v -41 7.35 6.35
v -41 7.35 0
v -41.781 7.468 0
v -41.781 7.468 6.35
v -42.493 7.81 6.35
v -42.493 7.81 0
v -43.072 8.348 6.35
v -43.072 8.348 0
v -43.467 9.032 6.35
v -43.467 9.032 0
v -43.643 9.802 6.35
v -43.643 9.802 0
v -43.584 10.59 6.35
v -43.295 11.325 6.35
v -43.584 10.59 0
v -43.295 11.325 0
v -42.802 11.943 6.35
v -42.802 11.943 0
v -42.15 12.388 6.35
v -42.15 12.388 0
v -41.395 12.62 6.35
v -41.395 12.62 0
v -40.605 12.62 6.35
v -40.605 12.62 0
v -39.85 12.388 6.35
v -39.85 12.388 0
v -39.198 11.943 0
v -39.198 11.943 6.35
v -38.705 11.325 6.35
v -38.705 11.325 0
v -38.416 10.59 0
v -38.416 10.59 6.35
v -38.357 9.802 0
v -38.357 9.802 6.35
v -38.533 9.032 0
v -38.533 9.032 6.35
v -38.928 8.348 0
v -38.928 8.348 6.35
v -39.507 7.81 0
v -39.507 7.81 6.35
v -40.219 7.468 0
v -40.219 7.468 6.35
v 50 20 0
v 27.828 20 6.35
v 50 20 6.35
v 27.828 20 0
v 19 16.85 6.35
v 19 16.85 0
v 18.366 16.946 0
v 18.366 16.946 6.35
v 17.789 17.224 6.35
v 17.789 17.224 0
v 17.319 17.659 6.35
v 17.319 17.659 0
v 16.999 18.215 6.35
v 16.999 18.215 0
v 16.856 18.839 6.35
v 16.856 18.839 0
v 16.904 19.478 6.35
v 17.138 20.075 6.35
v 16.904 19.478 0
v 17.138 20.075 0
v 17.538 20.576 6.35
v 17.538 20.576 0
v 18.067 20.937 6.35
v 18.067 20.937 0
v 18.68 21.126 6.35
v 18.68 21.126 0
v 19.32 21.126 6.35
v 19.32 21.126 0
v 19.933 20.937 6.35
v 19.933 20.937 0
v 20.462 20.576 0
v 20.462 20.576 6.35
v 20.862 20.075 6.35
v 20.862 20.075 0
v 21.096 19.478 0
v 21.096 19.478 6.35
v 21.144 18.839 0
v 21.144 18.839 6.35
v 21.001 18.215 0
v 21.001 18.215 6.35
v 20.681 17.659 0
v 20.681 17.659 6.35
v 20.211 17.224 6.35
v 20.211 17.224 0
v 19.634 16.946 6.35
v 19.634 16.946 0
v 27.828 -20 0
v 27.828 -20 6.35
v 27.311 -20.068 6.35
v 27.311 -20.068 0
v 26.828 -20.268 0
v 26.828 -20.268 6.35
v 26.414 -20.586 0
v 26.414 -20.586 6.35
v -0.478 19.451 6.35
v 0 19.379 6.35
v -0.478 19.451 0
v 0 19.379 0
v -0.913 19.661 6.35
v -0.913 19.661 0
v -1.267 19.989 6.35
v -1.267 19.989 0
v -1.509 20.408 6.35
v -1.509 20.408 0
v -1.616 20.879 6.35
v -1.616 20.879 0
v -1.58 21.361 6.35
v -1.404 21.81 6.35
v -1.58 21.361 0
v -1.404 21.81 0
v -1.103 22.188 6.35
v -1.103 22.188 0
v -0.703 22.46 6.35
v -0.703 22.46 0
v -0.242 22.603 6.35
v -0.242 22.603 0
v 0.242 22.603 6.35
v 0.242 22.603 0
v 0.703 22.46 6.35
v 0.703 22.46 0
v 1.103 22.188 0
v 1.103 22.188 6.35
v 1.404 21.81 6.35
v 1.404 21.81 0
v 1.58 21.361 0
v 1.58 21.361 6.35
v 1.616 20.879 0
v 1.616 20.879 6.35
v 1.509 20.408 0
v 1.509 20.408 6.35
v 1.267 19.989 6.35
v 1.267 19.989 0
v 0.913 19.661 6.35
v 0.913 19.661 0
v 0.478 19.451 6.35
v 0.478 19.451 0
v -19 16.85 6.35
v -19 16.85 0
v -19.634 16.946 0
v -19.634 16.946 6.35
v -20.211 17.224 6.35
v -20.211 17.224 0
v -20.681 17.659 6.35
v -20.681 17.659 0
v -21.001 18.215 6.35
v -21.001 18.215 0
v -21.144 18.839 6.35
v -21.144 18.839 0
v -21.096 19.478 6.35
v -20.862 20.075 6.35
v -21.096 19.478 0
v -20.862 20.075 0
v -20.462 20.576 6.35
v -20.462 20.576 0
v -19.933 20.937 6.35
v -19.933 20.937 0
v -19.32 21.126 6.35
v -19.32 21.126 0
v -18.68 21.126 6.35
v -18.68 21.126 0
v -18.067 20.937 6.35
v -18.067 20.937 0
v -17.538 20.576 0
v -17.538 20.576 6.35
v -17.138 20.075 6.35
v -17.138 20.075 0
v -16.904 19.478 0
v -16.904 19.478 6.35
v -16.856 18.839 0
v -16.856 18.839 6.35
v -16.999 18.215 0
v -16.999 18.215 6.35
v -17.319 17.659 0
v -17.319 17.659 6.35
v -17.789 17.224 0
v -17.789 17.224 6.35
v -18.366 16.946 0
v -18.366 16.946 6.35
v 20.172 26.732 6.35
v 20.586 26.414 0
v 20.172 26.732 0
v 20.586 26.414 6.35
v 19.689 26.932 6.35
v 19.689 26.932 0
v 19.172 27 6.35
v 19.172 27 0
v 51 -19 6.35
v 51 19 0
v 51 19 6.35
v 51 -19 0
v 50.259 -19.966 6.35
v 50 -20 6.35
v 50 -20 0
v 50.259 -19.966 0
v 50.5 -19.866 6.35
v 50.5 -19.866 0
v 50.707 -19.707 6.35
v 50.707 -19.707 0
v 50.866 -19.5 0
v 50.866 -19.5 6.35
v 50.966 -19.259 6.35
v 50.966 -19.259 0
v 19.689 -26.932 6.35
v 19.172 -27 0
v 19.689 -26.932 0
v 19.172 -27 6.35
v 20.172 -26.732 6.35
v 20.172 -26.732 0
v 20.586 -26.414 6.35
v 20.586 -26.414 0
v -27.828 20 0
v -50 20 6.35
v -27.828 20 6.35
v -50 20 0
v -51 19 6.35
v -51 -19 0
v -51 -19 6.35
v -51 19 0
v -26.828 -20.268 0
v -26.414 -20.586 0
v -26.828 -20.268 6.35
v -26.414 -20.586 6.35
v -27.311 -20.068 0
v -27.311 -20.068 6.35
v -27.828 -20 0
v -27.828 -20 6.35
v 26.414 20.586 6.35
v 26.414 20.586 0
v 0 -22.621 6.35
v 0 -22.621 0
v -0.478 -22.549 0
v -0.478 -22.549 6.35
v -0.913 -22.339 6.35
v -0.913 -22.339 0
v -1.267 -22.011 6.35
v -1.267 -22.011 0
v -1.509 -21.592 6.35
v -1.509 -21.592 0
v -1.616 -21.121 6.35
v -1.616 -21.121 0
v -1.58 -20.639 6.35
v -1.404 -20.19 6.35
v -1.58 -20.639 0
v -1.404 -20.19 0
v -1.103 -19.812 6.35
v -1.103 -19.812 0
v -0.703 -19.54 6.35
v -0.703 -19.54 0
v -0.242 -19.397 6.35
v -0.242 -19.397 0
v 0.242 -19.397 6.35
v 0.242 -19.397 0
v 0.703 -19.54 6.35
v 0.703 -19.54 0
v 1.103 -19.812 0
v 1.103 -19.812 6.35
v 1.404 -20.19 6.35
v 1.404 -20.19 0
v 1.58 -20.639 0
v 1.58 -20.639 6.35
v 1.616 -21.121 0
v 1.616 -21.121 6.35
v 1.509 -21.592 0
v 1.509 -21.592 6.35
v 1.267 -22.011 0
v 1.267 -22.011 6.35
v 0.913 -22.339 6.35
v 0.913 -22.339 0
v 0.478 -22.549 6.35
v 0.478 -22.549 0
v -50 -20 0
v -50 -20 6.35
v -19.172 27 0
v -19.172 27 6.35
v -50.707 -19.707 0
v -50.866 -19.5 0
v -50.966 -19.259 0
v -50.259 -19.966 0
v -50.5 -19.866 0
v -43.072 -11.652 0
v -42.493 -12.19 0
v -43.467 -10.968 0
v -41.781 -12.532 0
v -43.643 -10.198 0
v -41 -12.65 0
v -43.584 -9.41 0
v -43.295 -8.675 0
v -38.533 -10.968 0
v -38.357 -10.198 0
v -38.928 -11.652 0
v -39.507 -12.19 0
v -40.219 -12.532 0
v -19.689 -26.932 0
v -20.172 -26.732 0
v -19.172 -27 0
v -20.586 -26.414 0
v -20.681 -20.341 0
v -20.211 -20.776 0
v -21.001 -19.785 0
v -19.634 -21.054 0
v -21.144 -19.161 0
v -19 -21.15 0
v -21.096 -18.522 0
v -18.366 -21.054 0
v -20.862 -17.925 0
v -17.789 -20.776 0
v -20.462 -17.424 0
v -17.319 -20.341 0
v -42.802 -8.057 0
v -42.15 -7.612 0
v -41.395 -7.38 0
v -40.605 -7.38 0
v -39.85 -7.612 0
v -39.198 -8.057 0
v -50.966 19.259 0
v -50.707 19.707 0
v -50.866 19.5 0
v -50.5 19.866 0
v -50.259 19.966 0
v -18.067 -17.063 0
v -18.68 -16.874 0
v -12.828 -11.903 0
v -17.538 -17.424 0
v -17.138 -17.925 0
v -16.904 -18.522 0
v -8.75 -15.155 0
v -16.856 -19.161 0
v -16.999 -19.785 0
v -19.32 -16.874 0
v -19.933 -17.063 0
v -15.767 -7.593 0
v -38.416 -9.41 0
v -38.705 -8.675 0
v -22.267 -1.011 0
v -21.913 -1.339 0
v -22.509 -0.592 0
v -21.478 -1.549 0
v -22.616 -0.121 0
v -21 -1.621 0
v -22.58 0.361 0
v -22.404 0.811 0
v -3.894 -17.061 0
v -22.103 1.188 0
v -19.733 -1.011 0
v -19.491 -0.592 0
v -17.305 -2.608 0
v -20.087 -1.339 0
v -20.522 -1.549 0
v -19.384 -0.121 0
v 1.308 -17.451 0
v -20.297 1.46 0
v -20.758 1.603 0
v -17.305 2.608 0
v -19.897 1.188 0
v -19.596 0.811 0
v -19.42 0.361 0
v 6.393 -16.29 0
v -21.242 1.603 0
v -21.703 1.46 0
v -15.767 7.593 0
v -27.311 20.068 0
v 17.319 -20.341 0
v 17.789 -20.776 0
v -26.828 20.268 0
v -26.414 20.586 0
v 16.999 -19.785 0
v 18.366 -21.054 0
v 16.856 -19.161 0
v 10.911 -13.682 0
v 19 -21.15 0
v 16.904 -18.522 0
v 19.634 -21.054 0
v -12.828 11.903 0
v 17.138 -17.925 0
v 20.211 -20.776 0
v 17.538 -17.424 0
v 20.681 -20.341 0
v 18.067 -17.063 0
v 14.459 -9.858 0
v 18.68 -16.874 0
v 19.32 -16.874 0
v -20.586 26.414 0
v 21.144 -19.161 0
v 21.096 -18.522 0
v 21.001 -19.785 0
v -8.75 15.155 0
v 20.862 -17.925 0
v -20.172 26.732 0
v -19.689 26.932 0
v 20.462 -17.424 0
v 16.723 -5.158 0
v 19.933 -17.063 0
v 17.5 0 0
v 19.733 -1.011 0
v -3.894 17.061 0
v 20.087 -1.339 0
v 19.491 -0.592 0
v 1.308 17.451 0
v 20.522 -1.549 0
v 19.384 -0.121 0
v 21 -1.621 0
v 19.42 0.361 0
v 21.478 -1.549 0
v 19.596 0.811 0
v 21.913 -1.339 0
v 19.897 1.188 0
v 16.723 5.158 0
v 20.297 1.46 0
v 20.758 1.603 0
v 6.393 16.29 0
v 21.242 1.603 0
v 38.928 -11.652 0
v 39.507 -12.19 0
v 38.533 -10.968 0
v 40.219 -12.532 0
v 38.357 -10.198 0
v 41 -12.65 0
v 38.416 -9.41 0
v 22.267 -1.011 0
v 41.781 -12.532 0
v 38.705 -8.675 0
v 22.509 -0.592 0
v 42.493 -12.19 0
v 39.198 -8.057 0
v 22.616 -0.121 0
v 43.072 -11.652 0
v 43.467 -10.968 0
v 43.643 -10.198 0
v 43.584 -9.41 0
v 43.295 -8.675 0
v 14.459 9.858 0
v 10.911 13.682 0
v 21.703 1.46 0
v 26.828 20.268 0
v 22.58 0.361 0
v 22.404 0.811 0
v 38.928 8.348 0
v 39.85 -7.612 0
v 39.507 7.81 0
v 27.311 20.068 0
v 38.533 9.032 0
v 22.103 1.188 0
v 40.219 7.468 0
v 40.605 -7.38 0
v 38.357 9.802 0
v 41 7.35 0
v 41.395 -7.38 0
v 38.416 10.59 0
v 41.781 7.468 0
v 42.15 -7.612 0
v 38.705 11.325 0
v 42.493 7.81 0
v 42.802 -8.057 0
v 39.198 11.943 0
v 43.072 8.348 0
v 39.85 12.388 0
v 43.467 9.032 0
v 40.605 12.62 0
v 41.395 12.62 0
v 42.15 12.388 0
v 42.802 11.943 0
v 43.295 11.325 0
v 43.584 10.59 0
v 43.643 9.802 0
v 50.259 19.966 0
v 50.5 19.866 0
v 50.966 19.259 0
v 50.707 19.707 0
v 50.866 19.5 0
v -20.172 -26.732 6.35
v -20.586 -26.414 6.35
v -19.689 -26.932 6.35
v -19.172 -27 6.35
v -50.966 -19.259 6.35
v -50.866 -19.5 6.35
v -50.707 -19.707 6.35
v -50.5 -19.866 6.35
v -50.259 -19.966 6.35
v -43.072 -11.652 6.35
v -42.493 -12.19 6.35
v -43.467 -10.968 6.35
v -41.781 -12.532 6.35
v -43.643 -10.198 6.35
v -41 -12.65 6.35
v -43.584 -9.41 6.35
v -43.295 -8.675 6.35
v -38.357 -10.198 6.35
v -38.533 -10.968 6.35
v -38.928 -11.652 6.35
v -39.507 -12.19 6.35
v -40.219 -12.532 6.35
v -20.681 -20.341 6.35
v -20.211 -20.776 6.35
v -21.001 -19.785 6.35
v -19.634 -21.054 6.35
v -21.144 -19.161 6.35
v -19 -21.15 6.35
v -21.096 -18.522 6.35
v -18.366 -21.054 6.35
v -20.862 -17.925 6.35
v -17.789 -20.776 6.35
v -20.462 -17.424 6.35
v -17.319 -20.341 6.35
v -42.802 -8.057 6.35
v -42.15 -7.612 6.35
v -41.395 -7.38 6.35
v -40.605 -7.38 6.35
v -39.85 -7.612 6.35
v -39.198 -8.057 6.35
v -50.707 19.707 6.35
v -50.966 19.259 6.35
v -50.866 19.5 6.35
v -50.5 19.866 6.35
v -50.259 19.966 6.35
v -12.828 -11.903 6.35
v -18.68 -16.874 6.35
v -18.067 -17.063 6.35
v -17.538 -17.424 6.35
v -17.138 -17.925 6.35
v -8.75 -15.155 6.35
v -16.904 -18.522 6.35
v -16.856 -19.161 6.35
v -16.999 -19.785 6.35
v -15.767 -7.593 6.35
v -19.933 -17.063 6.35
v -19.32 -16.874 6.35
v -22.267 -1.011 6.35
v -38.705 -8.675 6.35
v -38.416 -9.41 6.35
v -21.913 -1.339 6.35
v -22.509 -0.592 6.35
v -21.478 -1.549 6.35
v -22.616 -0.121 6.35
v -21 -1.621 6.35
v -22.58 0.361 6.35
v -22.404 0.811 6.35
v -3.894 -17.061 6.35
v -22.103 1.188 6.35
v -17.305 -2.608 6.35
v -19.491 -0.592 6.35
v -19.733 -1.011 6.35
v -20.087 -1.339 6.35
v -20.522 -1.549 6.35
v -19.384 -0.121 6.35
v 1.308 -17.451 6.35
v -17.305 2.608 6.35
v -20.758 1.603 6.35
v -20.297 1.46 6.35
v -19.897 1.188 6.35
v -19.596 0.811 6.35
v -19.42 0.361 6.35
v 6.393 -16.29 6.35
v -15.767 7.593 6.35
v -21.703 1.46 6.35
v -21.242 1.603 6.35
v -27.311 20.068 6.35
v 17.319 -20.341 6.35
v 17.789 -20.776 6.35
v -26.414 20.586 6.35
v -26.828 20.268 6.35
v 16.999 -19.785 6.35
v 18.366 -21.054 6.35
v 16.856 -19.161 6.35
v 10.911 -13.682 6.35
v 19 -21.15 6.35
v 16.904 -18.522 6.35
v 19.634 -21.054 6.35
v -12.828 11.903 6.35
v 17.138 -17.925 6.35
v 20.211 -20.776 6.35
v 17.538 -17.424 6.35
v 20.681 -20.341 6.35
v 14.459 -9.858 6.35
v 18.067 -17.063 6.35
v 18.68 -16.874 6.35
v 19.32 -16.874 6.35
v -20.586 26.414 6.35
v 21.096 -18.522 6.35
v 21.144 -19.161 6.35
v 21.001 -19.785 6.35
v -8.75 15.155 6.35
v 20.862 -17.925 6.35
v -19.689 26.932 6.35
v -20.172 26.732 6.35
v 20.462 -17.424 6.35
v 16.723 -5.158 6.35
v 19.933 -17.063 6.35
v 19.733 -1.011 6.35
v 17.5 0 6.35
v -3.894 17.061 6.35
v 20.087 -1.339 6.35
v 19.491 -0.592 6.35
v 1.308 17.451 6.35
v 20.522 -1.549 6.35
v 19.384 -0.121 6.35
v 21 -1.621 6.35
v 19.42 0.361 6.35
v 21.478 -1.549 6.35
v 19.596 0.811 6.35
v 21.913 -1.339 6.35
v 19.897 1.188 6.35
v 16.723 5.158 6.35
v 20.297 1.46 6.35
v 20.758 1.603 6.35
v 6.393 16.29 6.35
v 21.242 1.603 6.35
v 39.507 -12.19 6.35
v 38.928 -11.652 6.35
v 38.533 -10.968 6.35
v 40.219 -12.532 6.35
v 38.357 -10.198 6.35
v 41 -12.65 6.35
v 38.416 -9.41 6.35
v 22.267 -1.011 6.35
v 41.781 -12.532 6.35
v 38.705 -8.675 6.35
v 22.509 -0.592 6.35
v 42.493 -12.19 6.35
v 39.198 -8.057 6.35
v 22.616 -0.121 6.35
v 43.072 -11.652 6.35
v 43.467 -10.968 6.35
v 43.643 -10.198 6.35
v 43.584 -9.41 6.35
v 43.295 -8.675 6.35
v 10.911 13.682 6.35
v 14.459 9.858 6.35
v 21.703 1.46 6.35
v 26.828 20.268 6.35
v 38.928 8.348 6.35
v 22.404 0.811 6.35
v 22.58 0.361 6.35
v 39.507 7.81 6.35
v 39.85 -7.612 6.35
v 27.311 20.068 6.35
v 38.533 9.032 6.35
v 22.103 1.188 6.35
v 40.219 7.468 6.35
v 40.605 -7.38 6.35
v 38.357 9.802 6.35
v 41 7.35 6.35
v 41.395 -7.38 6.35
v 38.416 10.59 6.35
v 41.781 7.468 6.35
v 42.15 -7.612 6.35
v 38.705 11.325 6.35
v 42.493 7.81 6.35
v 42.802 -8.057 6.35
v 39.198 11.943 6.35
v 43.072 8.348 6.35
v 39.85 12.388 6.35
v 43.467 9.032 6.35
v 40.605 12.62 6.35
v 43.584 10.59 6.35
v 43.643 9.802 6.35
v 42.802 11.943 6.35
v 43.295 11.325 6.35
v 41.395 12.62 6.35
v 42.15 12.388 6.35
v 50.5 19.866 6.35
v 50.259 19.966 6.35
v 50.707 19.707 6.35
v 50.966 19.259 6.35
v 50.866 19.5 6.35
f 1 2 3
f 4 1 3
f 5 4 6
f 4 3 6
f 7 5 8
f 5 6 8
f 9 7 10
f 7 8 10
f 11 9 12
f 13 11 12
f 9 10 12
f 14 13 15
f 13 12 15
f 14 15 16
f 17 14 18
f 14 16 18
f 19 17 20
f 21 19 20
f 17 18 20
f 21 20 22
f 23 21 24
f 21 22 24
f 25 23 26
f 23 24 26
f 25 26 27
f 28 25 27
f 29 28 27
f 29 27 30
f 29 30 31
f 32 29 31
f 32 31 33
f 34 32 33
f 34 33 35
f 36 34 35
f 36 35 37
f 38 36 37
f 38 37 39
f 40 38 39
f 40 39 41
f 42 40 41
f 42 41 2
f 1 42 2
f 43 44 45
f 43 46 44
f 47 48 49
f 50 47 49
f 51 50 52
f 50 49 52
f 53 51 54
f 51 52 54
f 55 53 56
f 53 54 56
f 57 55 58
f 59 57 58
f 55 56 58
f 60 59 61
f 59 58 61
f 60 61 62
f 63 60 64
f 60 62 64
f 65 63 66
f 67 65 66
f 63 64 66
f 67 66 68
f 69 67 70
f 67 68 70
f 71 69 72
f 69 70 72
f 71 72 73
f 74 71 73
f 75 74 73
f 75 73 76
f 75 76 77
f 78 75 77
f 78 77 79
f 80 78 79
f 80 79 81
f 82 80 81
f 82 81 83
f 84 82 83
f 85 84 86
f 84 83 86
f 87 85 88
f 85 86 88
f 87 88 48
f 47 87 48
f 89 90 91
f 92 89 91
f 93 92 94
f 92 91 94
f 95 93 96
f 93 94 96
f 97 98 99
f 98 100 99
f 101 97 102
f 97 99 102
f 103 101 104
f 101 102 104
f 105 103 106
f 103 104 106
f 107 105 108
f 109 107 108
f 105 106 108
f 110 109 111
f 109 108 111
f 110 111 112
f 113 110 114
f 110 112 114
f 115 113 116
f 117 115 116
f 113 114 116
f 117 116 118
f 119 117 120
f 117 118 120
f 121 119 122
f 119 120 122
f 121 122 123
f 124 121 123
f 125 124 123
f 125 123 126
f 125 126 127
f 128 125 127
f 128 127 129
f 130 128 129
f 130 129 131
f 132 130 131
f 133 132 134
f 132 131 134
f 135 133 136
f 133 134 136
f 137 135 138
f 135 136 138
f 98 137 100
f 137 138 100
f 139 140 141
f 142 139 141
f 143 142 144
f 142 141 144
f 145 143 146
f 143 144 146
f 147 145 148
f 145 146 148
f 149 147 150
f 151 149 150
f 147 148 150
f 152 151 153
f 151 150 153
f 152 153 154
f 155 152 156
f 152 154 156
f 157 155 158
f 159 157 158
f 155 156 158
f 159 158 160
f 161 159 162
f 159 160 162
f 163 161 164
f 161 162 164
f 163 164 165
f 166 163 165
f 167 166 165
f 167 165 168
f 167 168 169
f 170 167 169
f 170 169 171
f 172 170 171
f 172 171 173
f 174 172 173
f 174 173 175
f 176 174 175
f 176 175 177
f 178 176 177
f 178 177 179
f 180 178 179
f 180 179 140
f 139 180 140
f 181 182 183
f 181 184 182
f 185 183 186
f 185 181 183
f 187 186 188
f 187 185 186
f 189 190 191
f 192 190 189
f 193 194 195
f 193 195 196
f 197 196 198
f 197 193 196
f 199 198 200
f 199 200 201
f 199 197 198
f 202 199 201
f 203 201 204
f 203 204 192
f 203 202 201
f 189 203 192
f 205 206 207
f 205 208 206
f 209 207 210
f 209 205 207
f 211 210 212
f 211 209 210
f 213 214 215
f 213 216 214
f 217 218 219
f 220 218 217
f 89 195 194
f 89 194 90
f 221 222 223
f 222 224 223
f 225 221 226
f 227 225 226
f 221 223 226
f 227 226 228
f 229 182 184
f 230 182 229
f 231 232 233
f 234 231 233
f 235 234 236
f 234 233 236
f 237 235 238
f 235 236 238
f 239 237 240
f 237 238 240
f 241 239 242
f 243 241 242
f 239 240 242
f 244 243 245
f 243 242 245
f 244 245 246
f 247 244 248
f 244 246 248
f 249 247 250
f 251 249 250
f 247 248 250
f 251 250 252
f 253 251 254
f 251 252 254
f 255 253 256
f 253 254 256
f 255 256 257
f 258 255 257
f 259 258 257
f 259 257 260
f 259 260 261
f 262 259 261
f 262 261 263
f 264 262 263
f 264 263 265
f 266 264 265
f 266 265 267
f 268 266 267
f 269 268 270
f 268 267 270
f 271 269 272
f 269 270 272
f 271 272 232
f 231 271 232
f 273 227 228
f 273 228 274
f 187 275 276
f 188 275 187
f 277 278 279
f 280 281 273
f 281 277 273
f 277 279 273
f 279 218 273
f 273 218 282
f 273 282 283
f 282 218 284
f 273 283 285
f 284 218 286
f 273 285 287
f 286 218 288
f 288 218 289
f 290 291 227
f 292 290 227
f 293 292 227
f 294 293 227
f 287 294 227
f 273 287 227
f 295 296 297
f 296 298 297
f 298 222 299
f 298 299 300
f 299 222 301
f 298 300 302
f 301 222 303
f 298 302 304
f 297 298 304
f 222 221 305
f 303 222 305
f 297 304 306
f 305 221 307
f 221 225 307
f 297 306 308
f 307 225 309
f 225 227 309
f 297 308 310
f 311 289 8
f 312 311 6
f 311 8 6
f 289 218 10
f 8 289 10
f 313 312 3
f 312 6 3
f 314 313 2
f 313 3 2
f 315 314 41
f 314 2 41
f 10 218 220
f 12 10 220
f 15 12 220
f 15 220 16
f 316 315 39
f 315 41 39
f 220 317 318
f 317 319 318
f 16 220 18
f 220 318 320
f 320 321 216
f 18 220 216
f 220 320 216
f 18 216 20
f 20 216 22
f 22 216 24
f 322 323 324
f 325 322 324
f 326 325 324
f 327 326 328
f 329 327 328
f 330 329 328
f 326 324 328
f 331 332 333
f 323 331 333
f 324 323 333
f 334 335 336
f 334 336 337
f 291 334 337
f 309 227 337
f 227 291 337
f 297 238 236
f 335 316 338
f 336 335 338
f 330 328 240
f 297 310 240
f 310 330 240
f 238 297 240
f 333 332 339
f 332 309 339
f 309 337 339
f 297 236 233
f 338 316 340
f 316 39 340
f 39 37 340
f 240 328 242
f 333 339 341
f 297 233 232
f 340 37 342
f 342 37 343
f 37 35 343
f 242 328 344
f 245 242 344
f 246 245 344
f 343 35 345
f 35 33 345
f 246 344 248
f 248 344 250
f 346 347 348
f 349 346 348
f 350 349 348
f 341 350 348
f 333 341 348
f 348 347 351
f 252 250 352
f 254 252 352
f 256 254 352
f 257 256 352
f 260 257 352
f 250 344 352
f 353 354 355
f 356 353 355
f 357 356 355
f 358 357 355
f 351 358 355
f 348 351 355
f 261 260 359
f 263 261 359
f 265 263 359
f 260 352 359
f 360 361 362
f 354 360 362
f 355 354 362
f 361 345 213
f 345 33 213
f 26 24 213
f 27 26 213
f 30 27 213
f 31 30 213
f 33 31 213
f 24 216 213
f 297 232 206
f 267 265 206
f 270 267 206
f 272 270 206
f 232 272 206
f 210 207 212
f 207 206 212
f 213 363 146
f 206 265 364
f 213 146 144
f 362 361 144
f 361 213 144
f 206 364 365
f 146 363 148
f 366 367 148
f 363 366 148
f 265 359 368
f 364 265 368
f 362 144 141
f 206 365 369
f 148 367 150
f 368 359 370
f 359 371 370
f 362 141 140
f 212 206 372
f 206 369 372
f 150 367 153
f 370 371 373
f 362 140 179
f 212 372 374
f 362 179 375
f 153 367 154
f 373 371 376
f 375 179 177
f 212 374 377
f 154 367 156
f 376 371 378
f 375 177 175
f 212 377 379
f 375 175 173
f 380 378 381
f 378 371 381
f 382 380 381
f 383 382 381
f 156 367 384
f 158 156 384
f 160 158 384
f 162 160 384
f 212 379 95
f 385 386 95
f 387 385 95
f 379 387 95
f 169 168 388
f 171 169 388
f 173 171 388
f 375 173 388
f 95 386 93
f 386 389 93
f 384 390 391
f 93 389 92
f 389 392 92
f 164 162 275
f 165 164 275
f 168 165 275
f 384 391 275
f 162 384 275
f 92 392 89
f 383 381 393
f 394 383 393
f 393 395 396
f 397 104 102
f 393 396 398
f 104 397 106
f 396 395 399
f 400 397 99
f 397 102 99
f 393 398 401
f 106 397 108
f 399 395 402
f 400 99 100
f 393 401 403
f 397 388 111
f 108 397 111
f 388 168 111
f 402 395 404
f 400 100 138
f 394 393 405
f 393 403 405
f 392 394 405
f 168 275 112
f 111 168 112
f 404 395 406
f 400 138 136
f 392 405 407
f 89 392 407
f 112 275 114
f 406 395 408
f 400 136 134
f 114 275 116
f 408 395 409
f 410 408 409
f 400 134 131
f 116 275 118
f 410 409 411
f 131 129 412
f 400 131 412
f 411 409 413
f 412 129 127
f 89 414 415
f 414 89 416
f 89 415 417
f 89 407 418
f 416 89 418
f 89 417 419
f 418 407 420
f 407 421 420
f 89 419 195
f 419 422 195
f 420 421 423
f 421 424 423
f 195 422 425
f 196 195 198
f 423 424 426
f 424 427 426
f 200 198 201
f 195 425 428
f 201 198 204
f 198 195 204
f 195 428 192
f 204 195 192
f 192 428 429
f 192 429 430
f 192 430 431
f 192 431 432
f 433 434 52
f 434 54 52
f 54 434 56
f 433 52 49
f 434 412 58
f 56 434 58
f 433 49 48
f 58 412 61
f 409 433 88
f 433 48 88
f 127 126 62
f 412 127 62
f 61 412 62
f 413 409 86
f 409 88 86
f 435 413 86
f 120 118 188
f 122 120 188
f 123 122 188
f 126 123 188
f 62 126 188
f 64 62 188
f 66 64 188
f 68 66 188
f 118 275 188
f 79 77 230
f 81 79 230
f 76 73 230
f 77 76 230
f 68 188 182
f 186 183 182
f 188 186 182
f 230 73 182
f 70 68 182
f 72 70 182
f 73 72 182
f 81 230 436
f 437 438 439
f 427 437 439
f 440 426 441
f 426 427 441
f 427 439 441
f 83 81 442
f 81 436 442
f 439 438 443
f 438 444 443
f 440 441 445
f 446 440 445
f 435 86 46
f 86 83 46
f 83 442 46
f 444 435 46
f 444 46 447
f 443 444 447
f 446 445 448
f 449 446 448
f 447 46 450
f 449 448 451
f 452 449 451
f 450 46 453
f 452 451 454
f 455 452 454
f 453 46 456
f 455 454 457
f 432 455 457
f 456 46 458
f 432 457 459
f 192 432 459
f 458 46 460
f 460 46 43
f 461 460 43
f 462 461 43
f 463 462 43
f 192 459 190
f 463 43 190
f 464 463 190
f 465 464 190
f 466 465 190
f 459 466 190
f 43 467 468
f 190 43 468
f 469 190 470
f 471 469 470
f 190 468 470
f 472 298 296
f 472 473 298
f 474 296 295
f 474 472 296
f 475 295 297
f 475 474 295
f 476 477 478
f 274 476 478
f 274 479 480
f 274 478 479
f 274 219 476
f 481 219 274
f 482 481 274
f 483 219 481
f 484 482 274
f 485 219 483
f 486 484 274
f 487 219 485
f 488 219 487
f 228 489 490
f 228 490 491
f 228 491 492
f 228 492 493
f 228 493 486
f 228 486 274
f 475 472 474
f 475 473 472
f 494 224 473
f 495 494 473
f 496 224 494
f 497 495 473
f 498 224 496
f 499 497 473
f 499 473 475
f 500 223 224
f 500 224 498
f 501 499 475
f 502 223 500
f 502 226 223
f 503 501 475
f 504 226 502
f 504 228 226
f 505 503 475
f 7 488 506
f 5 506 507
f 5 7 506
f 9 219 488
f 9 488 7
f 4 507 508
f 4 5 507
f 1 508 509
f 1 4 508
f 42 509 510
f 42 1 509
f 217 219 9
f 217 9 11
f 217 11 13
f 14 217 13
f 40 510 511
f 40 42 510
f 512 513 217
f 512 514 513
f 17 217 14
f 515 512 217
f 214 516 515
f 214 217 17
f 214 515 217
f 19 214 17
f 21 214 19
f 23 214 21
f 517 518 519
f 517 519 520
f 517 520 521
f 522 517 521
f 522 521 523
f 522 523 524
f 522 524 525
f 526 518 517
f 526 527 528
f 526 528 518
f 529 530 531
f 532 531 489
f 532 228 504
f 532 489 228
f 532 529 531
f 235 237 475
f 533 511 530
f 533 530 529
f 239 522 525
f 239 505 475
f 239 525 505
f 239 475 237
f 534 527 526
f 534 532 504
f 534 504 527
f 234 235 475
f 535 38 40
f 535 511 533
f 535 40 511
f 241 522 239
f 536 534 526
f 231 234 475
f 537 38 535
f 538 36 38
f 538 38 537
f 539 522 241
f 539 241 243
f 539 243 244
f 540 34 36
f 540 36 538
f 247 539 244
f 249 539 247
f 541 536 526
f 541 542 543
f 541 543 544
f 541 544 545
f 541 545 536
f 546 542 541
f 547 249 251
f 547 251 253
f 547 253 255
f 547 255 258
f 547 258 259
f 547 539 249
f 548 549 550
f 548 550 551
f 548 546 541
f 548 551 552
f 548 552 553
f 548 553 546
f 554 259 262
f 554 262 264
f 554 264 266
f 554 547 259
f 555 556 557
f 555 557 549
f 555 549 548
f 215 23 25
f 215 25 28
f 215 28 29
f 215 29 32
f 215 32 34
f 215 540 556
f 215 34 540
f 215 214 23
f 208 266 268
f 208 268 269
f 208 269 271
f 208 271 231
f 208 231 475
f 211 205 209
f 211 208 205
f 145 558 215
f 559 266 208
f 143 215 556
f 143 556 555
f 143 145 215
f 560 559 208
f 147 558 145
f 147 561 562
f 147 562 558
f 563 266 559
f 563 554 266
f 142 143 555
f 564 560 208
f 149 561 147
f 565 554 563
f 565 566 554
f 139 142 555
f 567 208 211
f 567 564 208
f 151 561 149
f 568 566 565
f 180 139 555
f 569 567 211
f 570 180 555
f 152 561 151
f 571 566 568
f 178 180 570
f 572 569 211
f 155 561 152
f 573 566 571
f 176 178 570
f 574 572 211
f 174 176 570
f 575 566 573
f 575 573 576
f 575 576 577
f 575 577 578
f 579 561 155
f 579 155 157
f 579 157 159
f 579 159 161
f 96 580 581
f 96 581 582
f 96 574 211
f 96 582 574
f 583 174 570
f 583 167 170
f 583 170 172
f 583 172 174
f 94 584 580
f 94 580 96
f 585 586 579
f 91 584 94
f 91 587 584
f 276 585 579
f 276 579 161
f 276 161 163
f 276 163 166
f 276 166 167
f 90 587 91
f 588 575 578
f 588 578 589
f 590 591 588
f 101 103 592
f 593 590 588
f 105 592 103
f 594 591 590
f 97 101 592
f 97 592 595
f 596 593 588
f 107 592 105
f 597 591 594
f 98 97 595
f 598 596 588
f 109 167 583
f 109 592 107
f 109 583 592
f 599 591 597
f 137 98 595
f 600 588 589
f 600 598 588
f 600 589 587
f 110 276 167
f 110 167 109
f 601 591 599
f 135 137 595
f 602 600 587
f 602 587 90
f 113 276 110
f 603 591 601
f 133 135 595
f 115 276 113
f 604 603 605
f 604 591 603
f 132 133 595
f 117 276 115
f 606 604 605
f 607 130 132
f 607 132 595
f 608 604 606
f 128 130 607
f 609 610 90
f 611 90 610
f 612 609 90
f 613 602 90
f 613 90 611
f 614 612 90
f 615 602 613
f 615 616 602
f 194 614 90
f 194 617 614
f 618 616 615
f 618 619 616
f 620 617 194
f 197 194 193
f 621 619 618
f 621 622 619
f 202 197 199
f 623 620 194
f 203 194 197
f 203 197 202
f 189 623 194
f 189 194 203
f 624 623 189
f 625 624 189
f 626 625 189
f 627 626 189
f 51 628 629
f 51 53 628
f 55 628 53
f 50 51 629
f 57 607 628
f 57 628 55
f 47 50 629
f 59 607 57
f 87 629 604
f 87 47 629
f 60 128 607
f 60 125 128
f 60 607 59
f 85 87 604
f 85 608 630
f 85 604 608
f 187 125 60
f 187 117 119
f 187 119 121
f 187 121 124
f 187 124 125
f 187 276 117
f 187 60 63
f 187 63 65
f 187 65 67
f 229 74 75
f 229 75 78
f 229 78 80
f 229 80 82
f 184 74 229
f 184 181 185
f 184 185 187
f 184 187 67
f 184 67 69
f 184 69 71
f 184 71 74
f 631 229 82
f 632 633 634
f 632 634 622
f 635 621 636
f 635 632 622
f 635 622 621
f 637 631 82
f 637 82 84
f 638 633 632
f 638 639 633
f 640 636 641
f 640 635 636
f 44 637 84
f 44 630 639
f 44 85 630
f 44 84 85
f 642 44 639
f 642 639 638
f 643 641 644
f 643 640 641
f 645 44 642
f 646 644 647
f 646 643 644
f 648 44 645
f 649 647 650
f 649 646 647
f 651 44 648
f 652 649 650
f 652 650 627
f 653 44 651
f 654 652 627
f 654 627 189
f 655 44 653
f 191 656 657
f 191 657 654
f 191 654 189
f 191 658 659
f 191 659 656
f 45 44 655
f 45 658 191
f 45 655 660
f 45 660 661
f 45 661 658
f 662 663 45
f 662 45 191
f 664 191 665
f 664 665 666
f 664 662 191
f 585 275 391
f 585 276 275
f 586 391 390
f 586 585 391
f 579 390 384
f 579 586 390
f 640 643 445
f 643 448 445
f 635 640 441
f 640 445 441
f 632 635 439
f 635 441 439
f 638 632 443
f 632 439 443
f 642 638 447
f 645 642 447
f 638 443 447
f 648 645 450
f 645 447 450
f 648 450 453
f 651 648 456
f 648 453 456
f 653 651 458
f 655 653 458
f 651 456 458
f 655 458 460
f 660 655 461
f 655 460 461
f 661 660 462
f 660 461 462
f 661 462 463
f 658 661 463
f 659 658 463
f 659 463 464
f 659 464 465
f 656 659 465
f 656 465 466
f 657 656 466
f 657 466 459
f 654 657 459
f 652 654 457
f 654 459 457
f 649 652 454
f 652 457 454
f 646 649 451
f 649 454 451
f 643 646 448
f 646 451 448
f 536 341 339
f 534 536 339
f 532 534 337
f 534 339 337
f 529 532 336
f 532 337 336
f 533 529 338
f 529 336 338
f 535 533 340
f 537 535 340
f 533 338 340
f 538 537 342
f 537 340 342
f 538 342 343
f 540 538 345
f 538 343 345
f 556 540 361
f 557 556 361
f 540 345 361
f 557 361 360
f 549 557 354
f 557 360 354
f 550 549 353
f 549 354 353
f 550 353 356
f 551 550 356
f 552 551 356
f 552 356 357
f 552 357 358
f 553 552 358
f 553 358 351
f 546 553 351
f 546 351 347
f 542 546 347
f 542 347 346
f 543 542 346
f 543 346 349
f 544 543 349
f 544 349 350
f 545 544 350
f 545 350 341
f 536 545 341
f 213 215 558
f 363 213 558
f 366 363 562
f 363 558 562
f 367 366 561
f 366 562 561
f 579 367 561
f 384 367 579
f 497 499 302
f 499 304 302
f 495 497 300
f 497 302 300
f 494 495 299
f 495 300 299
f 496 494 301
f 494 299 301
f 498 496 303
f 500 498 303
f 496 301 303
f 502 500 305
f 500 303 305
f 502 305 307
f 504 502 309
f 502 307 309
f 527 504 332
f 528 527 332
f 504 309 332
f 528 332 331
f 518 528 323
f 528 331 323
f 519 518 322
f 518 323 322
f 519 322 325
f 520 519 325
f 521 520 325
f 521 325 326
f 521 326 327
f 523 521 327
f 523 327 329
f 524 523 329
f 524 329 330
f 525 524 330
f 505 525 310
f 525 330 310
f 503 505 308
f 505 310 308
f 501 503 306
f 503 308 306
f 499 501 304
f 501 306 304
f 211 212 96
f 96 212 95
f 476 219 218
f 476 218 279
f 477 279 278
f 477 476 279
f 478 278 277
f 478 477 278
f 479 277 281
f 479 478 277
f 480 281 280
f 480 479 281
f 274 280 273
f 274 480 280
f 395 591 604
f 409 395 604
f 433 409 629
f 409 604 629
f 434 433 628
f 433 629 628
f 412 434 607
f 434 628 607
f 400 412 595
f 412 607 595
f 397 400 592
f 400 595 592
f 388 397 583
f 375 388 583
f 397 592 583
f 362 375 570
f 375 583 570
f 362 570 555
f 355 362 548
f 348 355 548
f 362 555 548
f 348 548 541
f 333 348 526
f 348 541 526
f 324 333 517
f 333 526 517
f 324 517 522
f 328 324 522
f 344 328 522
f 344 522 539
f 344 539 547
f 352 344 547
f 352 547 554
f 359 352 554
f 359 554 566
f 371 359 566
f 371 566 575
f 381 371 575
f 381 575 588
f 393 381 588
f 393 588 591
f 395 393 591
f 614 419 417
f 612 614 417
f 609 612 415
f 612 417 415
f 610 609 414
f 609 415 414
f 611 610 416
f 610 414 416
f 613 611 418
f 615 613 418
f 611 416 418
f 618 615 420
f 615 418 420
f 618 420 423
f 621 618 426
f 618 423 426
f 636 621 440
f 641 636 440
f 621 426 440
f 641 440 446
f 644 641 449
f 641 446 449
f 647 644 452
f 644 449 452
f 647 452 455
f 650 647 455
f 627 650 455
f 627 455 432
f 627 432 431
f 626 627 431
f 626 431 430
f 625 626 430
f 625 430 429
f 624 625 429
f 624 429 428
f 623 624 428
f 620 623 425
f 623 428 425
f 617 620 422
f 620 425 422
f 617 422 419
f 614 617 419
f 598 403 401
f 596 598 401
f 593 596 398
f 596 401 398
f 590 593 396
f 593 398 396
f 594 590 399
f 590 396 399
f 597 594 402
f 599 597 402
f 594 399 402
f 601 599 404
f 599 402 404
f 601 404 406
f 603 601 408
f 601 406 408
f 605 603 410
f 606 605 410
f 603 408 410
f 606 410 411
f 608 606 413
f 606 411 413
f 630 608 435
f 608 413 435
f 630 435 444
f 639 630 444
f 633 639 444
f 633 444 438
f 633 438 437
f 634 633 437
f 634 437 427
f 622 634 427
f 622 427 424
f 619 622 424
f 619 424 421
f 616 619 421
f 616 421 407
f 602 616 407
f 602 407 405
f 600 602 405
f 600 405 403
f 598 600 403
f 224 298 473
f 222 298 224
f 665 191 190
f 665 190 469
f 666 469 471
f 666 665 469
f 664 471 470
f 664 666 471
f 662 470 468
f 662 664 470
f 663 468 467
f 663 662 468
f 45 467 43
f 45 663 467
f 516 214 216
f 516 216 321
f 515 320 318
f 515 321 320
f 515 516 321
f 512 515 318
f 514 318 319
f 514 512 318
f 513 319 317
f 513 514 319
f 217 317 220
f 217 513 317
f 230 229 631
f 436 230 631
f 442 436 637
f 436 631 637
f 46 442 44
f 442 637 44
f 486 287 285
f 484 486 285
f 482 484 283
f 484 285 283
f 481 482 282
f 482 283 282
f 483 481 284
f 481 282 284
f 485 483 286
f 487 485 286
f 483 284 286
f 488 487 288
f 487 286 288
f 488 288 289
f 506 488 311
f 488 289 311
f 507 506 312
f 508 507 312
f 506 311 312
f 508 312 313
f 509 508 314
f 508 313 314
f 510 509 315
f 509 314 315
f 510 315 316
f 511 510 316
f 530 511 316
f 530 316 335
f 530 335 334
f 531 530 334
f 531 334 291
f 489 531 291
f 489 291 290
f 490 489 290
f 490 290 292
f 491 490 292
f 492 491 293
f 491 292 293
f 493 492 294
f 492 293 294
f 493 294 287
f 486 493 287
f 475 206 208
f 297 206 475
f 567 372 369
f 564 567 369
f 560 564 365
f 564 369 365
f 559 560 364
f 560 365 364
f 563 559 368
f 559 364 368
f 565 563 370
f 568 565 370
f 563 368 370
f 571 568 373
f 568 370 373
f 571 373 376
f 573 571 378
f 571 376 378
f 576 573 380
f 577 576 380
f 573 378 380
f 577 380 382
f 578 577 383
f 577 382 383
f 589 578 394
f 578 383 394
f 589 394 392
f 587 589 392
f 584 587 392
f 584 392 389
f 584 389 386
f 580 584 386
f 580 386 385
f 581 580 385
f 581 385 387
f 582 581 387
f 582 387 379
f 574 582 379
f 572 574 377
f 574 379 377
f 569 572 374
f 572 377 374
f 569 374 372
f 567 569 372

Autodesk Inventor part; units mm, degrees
ref_plane "YZ Plane" through (0, 0, 0) normal (1, 0, 0) x (0, 1, 0)
ref_plane "XZ Plane" through (0, 0, 0) normal (0, 1, 0) x (-1, 0, 0)
ref_plane "XY Plane" through (0, 0, 0) normal (0, 0, 1) x (1, 0, 0)
sketch "Sketch1" plane through (0, 0, 0) normal (0, 0, 1) x (1, 0, 0)
  line L0 (51, -20) -> (-51, -20)
  line L1 (-51, -20) -> (-51, 20)
  line L2 (-51, 20) -> (51, 20)
  line L3 (51, 20) -> (51, -20)
  line L4 (51, -20) -> (-51, 20) construction
  line L5 (-51, -20) -> (51, 20) construction
  line L6 (21, -21) -> (-21, -21) construction
  line L7 (-21, -21) -> (-21, 21) construction
  line L8 (-21, 21) -> (21, 21) construction
  line L9 (21, 21) -> (21, -21) construction
  line L10 (21, -21) -> (-21, 21) construction
  line L11 (-21, -21) -> (21, 21) construction
  line L12 (29.6985, 0) -> (0, 29.6985) construction
  line L13 (0, 29.6985) -> (-29.6985, 0) construction
  line L14 (-29.6985, 0) -> (0, -29.6985) construction
  line L15 (0, -29.6985) -> (29.6985, 0) construction
  line L16 (29.6985, 0) -> (-29.6985, 0) construction
  line L17 (0, 29.6985) -> (0, -29.6985) construction
  circle A0 centre (0, 0) radius 26 construction
  line L18 (20, -27) -> (-20, -27)
  line L19 (-27, -20) -> (-27, 20)
  line L20 (-20, 27) -> (20, 27)
  line L21 (27, 20) -> (27, -20)
  line L22 (27, -27) -> (-27, 27) construction
  line L23 (-27, -27) -> (27, 27) construction
  line L24 (24.4641, -27) -> (17.5359, -27)
  line L25 (-27, 20) -> (-20, 27)
  line L26 (20, 27) -> (27, 20)
  line L27 (20, -27) -> (27, -20)
  line L28 (-20, -27) -> (-27, -20)
  circle A1 centre (-21, 21) radius 3.5355
  point P0 (28.5056, -20)
  point P1 (27, 20)
  point P2 (27, -20)
  point P3 (27, 20)
  point P4 (-27, -20)
  point P5 (27, -20)
  point P6 (-27, -20)
  dimension "d0" = 102
  dimension "d1" = 40
  dimension "d2" = 42
  dimension "d3" = 42
  dimension "d4" = 42
  dimension "d5" = 42
  dimension "d6" = 52
  dimension "d8" = 54
  dimension "d43" = 7
  dimension "d44" = 7
  dimension "d45" = 7
  dimension "d46" = 7
  dimension "d47" = 7
  dimension "d48" = 7
  dimension "d49" = 7
  dimension "d50" = 7
  dimension "d51" = 7
  dimension "d52" = 6
  dimension "d53" = 6
extrude "Extrusion1" add sketch "Sketch1" along normal blind 6.35
fillet "Fillet1" radius 1 4 edges at (-51, 20, 3.175) (-51, -20, 3.175) (51, 20, 3.175) (51, -20, 3.175)
fillet "Fillet2" radius 2 8 edges at (-20, -27, 3.175) (-20, 27, 3.175) (20, 27, 3.175) (20, -27, 3.175) (-27, -20, 3.175) (-27, 20, 3.175) (27, -20, 3.175) (27, 20, 3.175)
sketch "Sketch2" plane through (0, 0, 6.35) normal (0, 0, 1) x (1, 0, 0)
  circle A0 centre (0, 0) radius 17.5
  dimension "d13" = 35
extrude "Extrusion2" cut sketch "Sketch2" against normal through all
sketch "Sketch3" plane through (0, 0, 6.35) normal (0, 0, 1) x (1, 0, 0)
  circle A0 centre (0, 0) radius 21 construction
  circle A1 centre (0, 0) radius 17.5 projected
  line L0 (0, -21) -> (21, 0) construction
  line L1 (21, 0) -> (0, 21) construction
  line L2 (0, 21) -> (-21, 0) construction
  line L3 (-21, 0) -> (0, -21) construction
  line L4 (0, -21) -> (0, 21) construction
  line L5 (21, 0) -> (-21, 0) construction
  dimension "d17" = 42
hole "Hole1" at (0, 21, 6.35) at (21, 0, 6.35) at (0, -21, 6.35) at (-21, 0, 6.35) direction (0, 0, -1) diameter 3.242 end through all thread size "M4x0.7" class "6H" standard "ANSI Metric M Profile"
sketch "Sketch4" plane through (0, 0, 6.35) normal (0, 0, 1) x (1, 0, 0)
  line L0 (41, -10) -> (-41, -10)
  line L1 (-41, -10) -> (-41, 10)
  line L2 (-41, 10) -> (41, 10)
  line L3 (41, 10) -> (41, -10)
  line L4 (41, -10) -> (-41, 10) construction
  line L5 (-41, -10) -> (41, 10) construction
  line L6 (-51, 19) -> (-51, -19) projected
  point P0 (0, 0)
  dimension "d25" = 20
  dimension "d26" = 10
hole "Hole2" at (-41, 10, 6.35) at (-41, -10, 6.35) at (41, 10, 6.35) at (41, -10, 6.35) direction (0, 0, -1) diameter 5.3 end through all
sketch "Sketch5" plane through (0, 0, 6.35) normal (0, 0, 1) x (1, 0, 0)
  line L0 (19, -19) -> (-19, -19)
  line L1 (-19, -19) -> (-19, 19)
  line L2 (-19, 19) -> (19, 19)
  line L3 (19, 19) -> (19, -19)
  line L4 (19, -19) -> (-19, 19) construction
  line L5 (-19, -19) -> (19, 19) construction
  point P0 (0, 0)
  dimension "d34" = 38
  dimension "d35" = 38
hole "Hole3" at (-19, 19, 6.35) at (19, 19, 6.35) at (19, -19, 6.35) at (-19, -19, 6.35) direction (0, 0, -1) diameter 4.3 end through all
equation "\"d44\" = d43"
equation "\"d45\" = d44"
equation "\"d46\" = d44"
equation "\"d47\" = d46"
equation "\"d48\" = d44"
equation "\"d49\" = d48"
equation "\"d50\" = d44"
equation "\"d51\" = d50"
equation "\"d53\" = d52"
properties part number "Z-Axis Motor Plate" material "Aluminum 6061"
